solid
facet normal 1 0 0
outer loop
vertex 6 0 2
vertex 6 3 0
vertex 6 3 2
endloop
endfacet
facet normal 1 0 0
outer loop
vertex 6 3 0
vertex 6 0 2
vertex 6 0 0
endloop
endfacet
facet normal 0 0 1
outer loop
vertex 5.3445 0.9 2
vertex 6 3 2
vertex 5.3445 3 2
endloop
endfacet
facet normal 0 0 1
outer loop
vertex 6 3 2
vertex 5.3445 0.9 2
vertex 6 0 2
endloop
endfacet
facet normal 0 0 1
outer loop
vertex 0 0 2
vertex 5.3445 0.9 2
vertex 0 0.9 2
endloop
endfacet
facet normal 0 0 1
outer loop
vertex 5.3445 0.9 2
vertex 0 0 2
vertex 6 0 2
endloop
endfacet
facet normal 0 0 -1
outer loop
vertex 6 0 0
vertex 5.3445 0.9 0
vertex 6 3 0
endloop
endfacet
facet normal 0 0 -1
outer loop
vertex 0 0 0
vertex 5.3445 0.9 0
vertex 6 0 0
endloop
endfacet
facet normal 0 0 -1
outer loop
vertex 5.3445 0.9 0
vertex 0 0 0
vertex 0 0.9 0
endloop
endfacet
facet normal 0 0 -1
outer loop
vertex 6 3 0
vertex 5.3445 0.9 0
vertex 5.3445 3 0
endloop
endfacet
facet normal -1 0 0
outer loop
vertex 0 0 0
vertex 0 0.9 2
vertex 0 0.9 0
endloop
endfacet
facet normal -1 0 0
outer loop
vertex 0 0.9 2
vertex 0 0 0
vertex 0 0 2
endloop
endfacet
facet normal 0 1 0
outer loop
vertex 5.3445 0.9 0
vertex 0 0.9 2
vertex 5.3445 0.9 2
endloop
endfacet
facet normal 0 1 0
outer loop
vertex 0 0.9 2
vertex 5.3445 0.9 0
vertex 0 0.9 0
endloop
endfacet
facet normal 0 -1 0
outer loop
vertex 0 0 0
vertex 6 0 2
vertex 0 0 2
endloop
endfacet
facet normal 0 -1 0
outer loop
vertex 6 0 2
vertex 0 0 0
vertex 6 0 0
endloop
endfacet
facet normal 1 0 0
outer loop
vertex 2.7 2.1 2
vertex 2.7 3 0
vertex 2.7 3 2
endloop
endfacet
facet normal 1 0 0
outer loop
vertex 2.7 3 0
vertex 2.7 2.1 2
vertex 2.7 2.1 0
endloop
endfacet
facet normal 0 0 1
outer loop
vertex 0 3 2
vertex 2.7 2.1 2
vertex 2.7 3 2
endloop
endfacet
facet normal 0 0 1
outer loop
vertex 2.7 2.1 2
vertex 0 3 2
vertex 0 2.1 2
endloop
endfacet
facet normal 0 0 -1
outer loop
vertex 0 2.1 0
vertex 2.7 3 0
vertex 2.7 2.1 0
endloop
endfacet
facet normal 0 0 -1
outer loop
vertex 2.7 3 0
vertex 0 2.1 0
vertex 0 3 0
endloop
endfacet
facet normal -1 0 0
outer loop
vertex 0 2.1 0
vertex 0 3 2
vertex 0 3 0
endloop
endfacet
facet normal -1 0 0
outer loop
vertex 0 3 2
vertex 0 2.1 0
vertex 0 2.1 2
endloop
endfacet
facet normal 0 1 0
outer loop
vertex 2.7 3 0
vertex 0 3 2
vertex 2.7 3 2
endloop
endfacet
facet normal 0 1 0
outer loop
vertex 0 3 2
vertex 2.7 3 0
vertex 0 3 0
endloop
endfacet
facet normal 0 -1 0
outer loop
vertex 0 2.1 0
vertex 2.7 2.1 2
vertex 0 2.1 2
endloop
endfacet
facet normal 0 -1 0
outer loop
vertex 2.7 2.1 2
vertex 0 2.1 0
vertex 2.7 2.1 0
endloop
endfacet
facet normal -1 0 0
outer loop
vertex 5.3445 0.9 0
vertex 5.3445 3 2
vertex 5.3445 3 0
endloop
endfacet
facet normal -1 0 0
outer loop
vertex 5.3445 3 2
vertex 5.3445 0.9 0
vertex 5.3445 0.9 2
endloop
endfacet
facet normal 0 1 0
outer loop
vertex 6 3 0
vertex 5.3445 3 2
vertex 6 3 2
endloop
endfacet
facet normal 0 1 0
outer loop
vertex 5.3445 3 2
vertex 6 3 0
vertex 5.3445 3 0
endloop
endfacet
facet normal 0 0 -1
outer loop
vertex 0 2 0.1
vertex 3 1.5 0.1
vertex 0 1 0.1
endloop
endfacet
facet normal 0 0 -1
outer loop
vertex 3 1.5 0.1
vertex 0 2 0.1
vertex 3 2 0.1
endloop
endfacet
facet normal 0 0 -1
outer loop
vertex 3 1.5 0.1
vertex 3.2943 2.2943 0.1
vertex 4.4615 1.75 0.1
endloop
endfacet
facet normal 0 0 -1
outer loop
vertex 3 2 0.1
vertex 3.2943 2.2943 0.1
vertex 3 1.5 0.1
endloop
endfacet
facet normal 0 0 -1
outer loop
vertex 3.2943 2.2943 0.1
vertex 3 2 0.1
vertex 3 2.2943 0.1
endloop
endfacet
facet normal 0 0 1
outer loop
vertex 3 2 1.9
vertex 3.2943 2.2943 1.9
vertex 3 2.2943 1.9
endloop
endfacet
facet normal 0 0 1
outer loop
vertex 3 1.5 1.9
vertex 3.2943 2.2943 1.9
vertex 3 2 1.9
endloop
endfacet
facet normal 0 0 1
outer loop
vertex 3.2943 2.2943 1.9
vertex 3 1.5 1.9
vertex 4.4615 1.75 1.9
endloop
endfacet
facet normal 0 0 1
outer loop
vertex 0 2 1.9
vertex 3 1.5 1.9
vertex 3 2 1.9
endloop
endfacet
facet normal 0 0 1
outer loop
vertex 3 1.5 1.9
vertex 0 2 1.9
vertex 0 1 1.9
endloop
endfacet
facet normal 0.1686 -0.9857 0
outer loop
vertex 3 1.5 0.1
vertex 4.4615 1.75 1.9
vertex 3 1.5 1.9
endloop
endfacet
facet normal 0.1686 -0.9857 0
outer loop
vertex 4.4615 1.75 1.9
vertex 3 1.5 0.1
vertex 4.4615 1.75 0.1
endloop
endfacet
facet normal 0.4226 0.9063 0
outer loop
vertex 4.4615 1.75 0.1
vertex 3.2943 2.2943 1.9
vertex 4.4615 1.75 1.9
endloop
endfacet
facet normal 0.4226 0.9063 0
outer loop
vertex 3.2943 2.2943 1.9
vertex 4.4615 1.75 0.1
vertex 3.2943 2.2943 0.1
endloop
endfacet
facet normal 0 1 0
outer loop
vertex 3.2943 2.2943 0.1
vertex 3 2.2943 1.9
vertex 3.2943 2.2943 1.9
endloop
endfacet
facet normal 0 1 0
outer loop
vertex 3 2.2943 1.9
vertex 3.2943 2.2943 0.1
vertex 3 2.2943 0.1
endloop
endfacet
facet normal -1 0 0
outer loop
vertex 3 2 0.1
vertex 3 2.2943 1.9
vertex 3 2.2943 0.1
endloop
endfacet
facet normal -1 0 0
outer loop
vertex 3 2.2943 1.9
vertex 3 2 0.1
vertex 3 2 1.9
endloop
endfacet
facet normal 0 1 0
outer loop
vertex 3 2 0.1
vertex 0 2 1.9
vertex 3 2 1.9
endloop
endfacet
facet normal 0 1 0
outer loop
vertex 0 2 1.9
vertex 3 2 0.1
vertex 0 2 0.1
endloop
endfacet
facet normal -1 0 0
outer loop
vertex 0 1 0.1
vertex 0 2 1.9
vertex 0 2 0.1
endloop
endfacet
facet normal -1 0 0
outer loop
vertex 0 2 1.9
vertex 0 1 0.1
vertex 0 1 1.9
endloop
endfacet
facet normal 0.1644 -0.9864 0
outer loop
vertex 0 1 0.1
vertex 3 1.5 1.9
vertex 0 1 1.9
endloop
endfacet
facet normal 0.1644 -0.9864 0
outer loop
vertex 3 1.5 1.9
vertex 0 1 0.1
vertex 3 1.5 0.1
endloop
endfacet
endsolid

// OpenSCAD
// file: libraries/SnapLib/SnapLib.0.36.scad
/*simple Snap library based on "Snap-Fit Joints for Plastics - A Design Guid" by Bayer MaterialScience LLC 
  http://fab.cba.mit.edu/classes/S62.12/people/vernelle.noel/Plastic_Snap_fit_design.pdf
 
 on http://www.thingiverse.com/thing:1860118
 
    by fpetrac Fausto Petraccone fpetrac@gmail.com 
    Licensed under the Creative Commons - Attribution - Non-Commercial license.
*/

/*Rev
    SnapLib 0.36.scad: added SnapHoleY function  
    SnapLib 0.35.scad: on RSnapY added a check to avioid interference of lobes during closure; on RRSnappY added a check to avioid overlapped lobes.
    SnapLib 0.30.scad  added function Hsnap and Snap to calculate the snap H or Y for cantilever snap
    SnapLib 0.25.scad  added Scale factor f to reduce the calculate value h or y (this mantain the snap on unbreakable zone when f>1)
    SnapLib 0.20.scad  Bug Fix
    SnapLib 0.10.scad  added RSnapY RRSnapY
    SnapLib 0.00.scad  first release
*/


/*
eps=0.5*6/100;//Elongation at break of PLA=6%
eps=0.5*12/100;//Elongation at break of ABS=12%
eps=0.5*18/100;//Elongation at break of PETG=18%
*/

eps=0.5*6/100;//Elongation at break of PLA=6%


function Hsnap(l,y,f)= (1.09/f)*(eps*pow(l,2))/(y);
function Ysnap(l,h,f)= (1.09/f)*(eps*pow(l,2))/(h);

//SnapH(l,y,a,b,f=1) Define y calculate h and divide the calculte h value to a factor f
module SnapH(l,y,a,b,f=1)   
{
    h=Hsnap(l,y,f);
    p=y;
    echo("h is",h);
linear_extrude(height = b, center = f, convexity = 10, twist = 0)
polygon([[0,0],[l,0],[l,y],[l+p,y],[l+p+(y+h/4)/tan(a),-h/4],[l,-h/2],[0,-h]]);
}
//SnapY(l,h,a,b,f=1) Define h calculate y and divide the calculte y value to a factor f
module SnapY(l,h,a,b,f=1)
{
    y=Ysnap(l,h,f);
    p=y;
    echo("y is", y);
linear_extrude(height = b, center = f, convexity = 10, twist = 0)
polygon([[0,0],[l,0],[l,y],[l+p,y],[l+p+(y+h/4)/tan(a),-h/4],[l,-h/2],[0,-h]]);
}
//SnapHoleY(l,h,a,b,f=1,Pr=2) Define h calculate y and divide the calculte y value to a factor f the total hole depth is h*PR
module SnapHoleY(l,h,a,b,f=1,Pr=2){
        //%SnapY(l,h,a,b);  
        y=Ysnap(l,h,f);
        YY=Pr*h;//depth Y;
        XX=1.1*(y+(y+h/4)/tan(a)); //Altezza totale +10%
        ZZ=0+b; //largezza piu tolleranza
        union(){
            translate([0,-YY,(b-ZZ)/2])cube([l,YY,ZZ],center=false); //gambo
            translate([l,-YY,(b-ZZ)/2])cube([XX,YY+y,ZZ],center=false);//testa
        }    
 }



//Define h calculate y and divide the calculated value to f
module RSnapY(l,h,a,Lobi,r2,f=1,K2=2)   
{
    Theta=180/Lobi;
    y=(1.64/f)*K2*(eps*pow(l,2))/(r2);
    p=y;
    echo("y is", y);
    echo("r1/r2",(r2-h)/r2);
    echo("Theta", Theta);
    echo("r2-h",(r2-h));
    if(((r2-h)>y)&&(h<r2)){ //(r2-h)>y should be (r2-h/2)>y and  h<r2 for scad problem
      for(f=[0:1:Lobi])
          rotate([0,0,Theta*2*f])
              rotate_extrude(angle = Theta, convexity = 2,$fn=200)
                  translate([r2,0,0])
                      mirror([1,-1,0])
                          polygon([[0,0],[l,0],[l,y],[l+p,y],[l+p+(y+h/4)/tan(a),-h/4],[l,-h/2],[0,-h]]);
    }
    else{
      echo ("<b>WARNING:</b>");
      echo("y should be < r2-h ");
      echo("h should be < r2 ");
    }
}
//Define h calculate y and divide the calculated value to f
module RRSnapY(l,h,a,Lobi,r2,f=1,K1=2)
{
    Theta=180/Lobi;
    y=(1.64/f)*K1*(eps*pow(l,2))/(r2);
    p=y;
    echo("y is", y);
    echo("r1/r2",(r2-h)/r2);
    echo("Theta", Theta);
    echo("r2-y",(r2-y));
    if(y<r2){
      for(f=[0:1:Lobi])
          rotate([0,180,Theta*2*f])
              rotate_extrude(angle = Theta, convexity = 2,$fn=200)
                  translate([r2,0,0])
                      mirror([1,1,0])
                          polygon([[0,0],[l,0],[l,y],[l+p,y],[l+p+(y+h/4)/tan(a),-h/4],[l,-h/2],[0,-h]]);
  }
      else{
      echo ("<b>WARNING:</b>");
      echo("y should be < r2 ");
      }
}
// main file
// Utilities
use <libraries/SnapLib/SnapLib.0.36.scad>

// Snap Joints

/**
 * doubleCantileverSnap: creates the snap portion of a Cantilever Joint with 2 snap fits
 * x_size: size on x-axis of containing box
 * y_size: size on y-axis of containing box
 * z_size: size on z-axis of containing box
 */
module doubleCantileverSnap(size, tolerance=0.1, position="center") {
    x_size = size[0];
    y_size = size[1];
    z_size = size[2];
    corrected_z = z_size * (1 - tolerance);
    z_offset = (position == "center") ? (tolerance / 2) * z_size : 0;
    single_cantilever_base = y_size / 4;
    single_cantilever_leg_size = x_size / 2;
    // first snap
    translate([0,0,z_offset])
    translate([0, 3 *single_cantilever_base, 0])
    SnapY(l=single_cantilever_leg_size,h=single_cantilever_base,a=25,b=corrected_z);
    // second snap
    translate([0,0,z_offset])
    translate([0, 4 * single_cantilever_base, 0])
    mirror([0,1,0])
    translate([0, 3 *single_cantilever_base, 0])
    SnapY(l=single_cantilever_leg_size,h=single_cantilever_base,a=25,b=corrected_z);
}

/**
 * doubleCantileverHole: creates the hole portion of a Cantilever Joint with 2 snap fits
 * x_size: size on x-axis of containing box
 * y_size: size on y-axis of containing box
 * z_size: size on z-axis of containing box
 */
module doubleCantileverHole(size, tolerance =0.1) {
    x_size = size[0];
    y_size = size[1];
    z_size = size[2];
    ratio = 1 - tolerance;
    single_cantilever_base = y_size / 4;
    single_cantilever_leg_size = x_size / 2;
    overhang = Ysnap(l=single_cantilever_leg_size, h=single_cantilever_base, f=1);
    cube([single_cantilever_leg_size * ratio, single_cantilever_base * ratio, z_size]);
    translate([0, 4 * single_cantilever_base, 0])
    mirror([0,1,0])
    cube([single_cantilever_leg_size * ratio, single_cantilever_base * ratio, z_size]);
    snap_stop = single_cantilever_leg_size+ overhang + (overhang + single_cantilever_base/4)/tan(25);
    back_size = x_size - snap_stop - 3 * overhang;
    translate([snap_stop + 3 * overhang,0,0])
    cube([back_size,y_size,z_size]);
}

/**
 * singleCantileverSnap: creates the snap portion of a Cantilever Joint with 1 snap fit
 * x_size: size on x-axis of containing box
 * y_size: size on y-axis of containing box
 * z_size: size on z-axis of containing box
 */
module singleCantileverSnap(size, tolerance=0.1, position="center") {
    x_size = size[0];
    y_size = size[1];
    z_size = size[2];
    corrected_z = z_size * (1 - tolerance);
    z_offset = (position == "center") ? (tolerance / 2) * z_size : 0;
    single_cantilever_base = y_size / 3;
    single_cantilever_leg_size = x_size / 2;
    // first snap
    translate([0,0,z_offset])
    translate([0, 2 *single_cantilever_base, 0])
    SnapY(l=single_cantilever_leg_size,h=single_cantilever_base,a=25,b=corrected_z);
}

/**
 * singleCantileverHole: creates the hole portion of a Cantilever Joint with 2 snap fits
 * x_size: size on x-axis of containing box
 * y_size: size on y-axis of containing box
 * z_size: size on z-axis of containing box
 */
module singleCantileverHole(size, tolerance =0.1) {
    x_size = size[0];
    y_size = size[1];
    z_size = size[2];
    ratio = 1 - tolerance;
    single_cantilever_base = y_size / 3;
    single_cantilever_leg_size = x_size / 2;
    overhang = Ysnap(l=single_cantilever_leg_size, h=single_cantilever_base, f=1);
    cube([x_size, single_cantilever_base * ratio, z_size]);
    translate([0, 3 * single_cantilever_base, 0])
    mirror([0,1,0])
    cube([single_cantilever_leg_size * ratio, single_cantilever_base * ratio, z_size]);
    snap_stop = single_cantilever_leg_size+ overhang + (overhang + single_cantilever_base/4)/tan(25);
    back_size = x_size - snap_stop - 3 * overhang;
    translate([snap_stop + 3 * overhang,0,0])
    cube([back_size,y_size,z_size]);
}

// GOOD EXAMPLE
// color("red")
// cantileverSnap(7,4,2);
// color("green")
// cantileverHole(7,4,2);

box = [6,3,2];
color("red")
singleCantileverSnap(box, position="center");
color("green")
singleCantileverHole(box);
